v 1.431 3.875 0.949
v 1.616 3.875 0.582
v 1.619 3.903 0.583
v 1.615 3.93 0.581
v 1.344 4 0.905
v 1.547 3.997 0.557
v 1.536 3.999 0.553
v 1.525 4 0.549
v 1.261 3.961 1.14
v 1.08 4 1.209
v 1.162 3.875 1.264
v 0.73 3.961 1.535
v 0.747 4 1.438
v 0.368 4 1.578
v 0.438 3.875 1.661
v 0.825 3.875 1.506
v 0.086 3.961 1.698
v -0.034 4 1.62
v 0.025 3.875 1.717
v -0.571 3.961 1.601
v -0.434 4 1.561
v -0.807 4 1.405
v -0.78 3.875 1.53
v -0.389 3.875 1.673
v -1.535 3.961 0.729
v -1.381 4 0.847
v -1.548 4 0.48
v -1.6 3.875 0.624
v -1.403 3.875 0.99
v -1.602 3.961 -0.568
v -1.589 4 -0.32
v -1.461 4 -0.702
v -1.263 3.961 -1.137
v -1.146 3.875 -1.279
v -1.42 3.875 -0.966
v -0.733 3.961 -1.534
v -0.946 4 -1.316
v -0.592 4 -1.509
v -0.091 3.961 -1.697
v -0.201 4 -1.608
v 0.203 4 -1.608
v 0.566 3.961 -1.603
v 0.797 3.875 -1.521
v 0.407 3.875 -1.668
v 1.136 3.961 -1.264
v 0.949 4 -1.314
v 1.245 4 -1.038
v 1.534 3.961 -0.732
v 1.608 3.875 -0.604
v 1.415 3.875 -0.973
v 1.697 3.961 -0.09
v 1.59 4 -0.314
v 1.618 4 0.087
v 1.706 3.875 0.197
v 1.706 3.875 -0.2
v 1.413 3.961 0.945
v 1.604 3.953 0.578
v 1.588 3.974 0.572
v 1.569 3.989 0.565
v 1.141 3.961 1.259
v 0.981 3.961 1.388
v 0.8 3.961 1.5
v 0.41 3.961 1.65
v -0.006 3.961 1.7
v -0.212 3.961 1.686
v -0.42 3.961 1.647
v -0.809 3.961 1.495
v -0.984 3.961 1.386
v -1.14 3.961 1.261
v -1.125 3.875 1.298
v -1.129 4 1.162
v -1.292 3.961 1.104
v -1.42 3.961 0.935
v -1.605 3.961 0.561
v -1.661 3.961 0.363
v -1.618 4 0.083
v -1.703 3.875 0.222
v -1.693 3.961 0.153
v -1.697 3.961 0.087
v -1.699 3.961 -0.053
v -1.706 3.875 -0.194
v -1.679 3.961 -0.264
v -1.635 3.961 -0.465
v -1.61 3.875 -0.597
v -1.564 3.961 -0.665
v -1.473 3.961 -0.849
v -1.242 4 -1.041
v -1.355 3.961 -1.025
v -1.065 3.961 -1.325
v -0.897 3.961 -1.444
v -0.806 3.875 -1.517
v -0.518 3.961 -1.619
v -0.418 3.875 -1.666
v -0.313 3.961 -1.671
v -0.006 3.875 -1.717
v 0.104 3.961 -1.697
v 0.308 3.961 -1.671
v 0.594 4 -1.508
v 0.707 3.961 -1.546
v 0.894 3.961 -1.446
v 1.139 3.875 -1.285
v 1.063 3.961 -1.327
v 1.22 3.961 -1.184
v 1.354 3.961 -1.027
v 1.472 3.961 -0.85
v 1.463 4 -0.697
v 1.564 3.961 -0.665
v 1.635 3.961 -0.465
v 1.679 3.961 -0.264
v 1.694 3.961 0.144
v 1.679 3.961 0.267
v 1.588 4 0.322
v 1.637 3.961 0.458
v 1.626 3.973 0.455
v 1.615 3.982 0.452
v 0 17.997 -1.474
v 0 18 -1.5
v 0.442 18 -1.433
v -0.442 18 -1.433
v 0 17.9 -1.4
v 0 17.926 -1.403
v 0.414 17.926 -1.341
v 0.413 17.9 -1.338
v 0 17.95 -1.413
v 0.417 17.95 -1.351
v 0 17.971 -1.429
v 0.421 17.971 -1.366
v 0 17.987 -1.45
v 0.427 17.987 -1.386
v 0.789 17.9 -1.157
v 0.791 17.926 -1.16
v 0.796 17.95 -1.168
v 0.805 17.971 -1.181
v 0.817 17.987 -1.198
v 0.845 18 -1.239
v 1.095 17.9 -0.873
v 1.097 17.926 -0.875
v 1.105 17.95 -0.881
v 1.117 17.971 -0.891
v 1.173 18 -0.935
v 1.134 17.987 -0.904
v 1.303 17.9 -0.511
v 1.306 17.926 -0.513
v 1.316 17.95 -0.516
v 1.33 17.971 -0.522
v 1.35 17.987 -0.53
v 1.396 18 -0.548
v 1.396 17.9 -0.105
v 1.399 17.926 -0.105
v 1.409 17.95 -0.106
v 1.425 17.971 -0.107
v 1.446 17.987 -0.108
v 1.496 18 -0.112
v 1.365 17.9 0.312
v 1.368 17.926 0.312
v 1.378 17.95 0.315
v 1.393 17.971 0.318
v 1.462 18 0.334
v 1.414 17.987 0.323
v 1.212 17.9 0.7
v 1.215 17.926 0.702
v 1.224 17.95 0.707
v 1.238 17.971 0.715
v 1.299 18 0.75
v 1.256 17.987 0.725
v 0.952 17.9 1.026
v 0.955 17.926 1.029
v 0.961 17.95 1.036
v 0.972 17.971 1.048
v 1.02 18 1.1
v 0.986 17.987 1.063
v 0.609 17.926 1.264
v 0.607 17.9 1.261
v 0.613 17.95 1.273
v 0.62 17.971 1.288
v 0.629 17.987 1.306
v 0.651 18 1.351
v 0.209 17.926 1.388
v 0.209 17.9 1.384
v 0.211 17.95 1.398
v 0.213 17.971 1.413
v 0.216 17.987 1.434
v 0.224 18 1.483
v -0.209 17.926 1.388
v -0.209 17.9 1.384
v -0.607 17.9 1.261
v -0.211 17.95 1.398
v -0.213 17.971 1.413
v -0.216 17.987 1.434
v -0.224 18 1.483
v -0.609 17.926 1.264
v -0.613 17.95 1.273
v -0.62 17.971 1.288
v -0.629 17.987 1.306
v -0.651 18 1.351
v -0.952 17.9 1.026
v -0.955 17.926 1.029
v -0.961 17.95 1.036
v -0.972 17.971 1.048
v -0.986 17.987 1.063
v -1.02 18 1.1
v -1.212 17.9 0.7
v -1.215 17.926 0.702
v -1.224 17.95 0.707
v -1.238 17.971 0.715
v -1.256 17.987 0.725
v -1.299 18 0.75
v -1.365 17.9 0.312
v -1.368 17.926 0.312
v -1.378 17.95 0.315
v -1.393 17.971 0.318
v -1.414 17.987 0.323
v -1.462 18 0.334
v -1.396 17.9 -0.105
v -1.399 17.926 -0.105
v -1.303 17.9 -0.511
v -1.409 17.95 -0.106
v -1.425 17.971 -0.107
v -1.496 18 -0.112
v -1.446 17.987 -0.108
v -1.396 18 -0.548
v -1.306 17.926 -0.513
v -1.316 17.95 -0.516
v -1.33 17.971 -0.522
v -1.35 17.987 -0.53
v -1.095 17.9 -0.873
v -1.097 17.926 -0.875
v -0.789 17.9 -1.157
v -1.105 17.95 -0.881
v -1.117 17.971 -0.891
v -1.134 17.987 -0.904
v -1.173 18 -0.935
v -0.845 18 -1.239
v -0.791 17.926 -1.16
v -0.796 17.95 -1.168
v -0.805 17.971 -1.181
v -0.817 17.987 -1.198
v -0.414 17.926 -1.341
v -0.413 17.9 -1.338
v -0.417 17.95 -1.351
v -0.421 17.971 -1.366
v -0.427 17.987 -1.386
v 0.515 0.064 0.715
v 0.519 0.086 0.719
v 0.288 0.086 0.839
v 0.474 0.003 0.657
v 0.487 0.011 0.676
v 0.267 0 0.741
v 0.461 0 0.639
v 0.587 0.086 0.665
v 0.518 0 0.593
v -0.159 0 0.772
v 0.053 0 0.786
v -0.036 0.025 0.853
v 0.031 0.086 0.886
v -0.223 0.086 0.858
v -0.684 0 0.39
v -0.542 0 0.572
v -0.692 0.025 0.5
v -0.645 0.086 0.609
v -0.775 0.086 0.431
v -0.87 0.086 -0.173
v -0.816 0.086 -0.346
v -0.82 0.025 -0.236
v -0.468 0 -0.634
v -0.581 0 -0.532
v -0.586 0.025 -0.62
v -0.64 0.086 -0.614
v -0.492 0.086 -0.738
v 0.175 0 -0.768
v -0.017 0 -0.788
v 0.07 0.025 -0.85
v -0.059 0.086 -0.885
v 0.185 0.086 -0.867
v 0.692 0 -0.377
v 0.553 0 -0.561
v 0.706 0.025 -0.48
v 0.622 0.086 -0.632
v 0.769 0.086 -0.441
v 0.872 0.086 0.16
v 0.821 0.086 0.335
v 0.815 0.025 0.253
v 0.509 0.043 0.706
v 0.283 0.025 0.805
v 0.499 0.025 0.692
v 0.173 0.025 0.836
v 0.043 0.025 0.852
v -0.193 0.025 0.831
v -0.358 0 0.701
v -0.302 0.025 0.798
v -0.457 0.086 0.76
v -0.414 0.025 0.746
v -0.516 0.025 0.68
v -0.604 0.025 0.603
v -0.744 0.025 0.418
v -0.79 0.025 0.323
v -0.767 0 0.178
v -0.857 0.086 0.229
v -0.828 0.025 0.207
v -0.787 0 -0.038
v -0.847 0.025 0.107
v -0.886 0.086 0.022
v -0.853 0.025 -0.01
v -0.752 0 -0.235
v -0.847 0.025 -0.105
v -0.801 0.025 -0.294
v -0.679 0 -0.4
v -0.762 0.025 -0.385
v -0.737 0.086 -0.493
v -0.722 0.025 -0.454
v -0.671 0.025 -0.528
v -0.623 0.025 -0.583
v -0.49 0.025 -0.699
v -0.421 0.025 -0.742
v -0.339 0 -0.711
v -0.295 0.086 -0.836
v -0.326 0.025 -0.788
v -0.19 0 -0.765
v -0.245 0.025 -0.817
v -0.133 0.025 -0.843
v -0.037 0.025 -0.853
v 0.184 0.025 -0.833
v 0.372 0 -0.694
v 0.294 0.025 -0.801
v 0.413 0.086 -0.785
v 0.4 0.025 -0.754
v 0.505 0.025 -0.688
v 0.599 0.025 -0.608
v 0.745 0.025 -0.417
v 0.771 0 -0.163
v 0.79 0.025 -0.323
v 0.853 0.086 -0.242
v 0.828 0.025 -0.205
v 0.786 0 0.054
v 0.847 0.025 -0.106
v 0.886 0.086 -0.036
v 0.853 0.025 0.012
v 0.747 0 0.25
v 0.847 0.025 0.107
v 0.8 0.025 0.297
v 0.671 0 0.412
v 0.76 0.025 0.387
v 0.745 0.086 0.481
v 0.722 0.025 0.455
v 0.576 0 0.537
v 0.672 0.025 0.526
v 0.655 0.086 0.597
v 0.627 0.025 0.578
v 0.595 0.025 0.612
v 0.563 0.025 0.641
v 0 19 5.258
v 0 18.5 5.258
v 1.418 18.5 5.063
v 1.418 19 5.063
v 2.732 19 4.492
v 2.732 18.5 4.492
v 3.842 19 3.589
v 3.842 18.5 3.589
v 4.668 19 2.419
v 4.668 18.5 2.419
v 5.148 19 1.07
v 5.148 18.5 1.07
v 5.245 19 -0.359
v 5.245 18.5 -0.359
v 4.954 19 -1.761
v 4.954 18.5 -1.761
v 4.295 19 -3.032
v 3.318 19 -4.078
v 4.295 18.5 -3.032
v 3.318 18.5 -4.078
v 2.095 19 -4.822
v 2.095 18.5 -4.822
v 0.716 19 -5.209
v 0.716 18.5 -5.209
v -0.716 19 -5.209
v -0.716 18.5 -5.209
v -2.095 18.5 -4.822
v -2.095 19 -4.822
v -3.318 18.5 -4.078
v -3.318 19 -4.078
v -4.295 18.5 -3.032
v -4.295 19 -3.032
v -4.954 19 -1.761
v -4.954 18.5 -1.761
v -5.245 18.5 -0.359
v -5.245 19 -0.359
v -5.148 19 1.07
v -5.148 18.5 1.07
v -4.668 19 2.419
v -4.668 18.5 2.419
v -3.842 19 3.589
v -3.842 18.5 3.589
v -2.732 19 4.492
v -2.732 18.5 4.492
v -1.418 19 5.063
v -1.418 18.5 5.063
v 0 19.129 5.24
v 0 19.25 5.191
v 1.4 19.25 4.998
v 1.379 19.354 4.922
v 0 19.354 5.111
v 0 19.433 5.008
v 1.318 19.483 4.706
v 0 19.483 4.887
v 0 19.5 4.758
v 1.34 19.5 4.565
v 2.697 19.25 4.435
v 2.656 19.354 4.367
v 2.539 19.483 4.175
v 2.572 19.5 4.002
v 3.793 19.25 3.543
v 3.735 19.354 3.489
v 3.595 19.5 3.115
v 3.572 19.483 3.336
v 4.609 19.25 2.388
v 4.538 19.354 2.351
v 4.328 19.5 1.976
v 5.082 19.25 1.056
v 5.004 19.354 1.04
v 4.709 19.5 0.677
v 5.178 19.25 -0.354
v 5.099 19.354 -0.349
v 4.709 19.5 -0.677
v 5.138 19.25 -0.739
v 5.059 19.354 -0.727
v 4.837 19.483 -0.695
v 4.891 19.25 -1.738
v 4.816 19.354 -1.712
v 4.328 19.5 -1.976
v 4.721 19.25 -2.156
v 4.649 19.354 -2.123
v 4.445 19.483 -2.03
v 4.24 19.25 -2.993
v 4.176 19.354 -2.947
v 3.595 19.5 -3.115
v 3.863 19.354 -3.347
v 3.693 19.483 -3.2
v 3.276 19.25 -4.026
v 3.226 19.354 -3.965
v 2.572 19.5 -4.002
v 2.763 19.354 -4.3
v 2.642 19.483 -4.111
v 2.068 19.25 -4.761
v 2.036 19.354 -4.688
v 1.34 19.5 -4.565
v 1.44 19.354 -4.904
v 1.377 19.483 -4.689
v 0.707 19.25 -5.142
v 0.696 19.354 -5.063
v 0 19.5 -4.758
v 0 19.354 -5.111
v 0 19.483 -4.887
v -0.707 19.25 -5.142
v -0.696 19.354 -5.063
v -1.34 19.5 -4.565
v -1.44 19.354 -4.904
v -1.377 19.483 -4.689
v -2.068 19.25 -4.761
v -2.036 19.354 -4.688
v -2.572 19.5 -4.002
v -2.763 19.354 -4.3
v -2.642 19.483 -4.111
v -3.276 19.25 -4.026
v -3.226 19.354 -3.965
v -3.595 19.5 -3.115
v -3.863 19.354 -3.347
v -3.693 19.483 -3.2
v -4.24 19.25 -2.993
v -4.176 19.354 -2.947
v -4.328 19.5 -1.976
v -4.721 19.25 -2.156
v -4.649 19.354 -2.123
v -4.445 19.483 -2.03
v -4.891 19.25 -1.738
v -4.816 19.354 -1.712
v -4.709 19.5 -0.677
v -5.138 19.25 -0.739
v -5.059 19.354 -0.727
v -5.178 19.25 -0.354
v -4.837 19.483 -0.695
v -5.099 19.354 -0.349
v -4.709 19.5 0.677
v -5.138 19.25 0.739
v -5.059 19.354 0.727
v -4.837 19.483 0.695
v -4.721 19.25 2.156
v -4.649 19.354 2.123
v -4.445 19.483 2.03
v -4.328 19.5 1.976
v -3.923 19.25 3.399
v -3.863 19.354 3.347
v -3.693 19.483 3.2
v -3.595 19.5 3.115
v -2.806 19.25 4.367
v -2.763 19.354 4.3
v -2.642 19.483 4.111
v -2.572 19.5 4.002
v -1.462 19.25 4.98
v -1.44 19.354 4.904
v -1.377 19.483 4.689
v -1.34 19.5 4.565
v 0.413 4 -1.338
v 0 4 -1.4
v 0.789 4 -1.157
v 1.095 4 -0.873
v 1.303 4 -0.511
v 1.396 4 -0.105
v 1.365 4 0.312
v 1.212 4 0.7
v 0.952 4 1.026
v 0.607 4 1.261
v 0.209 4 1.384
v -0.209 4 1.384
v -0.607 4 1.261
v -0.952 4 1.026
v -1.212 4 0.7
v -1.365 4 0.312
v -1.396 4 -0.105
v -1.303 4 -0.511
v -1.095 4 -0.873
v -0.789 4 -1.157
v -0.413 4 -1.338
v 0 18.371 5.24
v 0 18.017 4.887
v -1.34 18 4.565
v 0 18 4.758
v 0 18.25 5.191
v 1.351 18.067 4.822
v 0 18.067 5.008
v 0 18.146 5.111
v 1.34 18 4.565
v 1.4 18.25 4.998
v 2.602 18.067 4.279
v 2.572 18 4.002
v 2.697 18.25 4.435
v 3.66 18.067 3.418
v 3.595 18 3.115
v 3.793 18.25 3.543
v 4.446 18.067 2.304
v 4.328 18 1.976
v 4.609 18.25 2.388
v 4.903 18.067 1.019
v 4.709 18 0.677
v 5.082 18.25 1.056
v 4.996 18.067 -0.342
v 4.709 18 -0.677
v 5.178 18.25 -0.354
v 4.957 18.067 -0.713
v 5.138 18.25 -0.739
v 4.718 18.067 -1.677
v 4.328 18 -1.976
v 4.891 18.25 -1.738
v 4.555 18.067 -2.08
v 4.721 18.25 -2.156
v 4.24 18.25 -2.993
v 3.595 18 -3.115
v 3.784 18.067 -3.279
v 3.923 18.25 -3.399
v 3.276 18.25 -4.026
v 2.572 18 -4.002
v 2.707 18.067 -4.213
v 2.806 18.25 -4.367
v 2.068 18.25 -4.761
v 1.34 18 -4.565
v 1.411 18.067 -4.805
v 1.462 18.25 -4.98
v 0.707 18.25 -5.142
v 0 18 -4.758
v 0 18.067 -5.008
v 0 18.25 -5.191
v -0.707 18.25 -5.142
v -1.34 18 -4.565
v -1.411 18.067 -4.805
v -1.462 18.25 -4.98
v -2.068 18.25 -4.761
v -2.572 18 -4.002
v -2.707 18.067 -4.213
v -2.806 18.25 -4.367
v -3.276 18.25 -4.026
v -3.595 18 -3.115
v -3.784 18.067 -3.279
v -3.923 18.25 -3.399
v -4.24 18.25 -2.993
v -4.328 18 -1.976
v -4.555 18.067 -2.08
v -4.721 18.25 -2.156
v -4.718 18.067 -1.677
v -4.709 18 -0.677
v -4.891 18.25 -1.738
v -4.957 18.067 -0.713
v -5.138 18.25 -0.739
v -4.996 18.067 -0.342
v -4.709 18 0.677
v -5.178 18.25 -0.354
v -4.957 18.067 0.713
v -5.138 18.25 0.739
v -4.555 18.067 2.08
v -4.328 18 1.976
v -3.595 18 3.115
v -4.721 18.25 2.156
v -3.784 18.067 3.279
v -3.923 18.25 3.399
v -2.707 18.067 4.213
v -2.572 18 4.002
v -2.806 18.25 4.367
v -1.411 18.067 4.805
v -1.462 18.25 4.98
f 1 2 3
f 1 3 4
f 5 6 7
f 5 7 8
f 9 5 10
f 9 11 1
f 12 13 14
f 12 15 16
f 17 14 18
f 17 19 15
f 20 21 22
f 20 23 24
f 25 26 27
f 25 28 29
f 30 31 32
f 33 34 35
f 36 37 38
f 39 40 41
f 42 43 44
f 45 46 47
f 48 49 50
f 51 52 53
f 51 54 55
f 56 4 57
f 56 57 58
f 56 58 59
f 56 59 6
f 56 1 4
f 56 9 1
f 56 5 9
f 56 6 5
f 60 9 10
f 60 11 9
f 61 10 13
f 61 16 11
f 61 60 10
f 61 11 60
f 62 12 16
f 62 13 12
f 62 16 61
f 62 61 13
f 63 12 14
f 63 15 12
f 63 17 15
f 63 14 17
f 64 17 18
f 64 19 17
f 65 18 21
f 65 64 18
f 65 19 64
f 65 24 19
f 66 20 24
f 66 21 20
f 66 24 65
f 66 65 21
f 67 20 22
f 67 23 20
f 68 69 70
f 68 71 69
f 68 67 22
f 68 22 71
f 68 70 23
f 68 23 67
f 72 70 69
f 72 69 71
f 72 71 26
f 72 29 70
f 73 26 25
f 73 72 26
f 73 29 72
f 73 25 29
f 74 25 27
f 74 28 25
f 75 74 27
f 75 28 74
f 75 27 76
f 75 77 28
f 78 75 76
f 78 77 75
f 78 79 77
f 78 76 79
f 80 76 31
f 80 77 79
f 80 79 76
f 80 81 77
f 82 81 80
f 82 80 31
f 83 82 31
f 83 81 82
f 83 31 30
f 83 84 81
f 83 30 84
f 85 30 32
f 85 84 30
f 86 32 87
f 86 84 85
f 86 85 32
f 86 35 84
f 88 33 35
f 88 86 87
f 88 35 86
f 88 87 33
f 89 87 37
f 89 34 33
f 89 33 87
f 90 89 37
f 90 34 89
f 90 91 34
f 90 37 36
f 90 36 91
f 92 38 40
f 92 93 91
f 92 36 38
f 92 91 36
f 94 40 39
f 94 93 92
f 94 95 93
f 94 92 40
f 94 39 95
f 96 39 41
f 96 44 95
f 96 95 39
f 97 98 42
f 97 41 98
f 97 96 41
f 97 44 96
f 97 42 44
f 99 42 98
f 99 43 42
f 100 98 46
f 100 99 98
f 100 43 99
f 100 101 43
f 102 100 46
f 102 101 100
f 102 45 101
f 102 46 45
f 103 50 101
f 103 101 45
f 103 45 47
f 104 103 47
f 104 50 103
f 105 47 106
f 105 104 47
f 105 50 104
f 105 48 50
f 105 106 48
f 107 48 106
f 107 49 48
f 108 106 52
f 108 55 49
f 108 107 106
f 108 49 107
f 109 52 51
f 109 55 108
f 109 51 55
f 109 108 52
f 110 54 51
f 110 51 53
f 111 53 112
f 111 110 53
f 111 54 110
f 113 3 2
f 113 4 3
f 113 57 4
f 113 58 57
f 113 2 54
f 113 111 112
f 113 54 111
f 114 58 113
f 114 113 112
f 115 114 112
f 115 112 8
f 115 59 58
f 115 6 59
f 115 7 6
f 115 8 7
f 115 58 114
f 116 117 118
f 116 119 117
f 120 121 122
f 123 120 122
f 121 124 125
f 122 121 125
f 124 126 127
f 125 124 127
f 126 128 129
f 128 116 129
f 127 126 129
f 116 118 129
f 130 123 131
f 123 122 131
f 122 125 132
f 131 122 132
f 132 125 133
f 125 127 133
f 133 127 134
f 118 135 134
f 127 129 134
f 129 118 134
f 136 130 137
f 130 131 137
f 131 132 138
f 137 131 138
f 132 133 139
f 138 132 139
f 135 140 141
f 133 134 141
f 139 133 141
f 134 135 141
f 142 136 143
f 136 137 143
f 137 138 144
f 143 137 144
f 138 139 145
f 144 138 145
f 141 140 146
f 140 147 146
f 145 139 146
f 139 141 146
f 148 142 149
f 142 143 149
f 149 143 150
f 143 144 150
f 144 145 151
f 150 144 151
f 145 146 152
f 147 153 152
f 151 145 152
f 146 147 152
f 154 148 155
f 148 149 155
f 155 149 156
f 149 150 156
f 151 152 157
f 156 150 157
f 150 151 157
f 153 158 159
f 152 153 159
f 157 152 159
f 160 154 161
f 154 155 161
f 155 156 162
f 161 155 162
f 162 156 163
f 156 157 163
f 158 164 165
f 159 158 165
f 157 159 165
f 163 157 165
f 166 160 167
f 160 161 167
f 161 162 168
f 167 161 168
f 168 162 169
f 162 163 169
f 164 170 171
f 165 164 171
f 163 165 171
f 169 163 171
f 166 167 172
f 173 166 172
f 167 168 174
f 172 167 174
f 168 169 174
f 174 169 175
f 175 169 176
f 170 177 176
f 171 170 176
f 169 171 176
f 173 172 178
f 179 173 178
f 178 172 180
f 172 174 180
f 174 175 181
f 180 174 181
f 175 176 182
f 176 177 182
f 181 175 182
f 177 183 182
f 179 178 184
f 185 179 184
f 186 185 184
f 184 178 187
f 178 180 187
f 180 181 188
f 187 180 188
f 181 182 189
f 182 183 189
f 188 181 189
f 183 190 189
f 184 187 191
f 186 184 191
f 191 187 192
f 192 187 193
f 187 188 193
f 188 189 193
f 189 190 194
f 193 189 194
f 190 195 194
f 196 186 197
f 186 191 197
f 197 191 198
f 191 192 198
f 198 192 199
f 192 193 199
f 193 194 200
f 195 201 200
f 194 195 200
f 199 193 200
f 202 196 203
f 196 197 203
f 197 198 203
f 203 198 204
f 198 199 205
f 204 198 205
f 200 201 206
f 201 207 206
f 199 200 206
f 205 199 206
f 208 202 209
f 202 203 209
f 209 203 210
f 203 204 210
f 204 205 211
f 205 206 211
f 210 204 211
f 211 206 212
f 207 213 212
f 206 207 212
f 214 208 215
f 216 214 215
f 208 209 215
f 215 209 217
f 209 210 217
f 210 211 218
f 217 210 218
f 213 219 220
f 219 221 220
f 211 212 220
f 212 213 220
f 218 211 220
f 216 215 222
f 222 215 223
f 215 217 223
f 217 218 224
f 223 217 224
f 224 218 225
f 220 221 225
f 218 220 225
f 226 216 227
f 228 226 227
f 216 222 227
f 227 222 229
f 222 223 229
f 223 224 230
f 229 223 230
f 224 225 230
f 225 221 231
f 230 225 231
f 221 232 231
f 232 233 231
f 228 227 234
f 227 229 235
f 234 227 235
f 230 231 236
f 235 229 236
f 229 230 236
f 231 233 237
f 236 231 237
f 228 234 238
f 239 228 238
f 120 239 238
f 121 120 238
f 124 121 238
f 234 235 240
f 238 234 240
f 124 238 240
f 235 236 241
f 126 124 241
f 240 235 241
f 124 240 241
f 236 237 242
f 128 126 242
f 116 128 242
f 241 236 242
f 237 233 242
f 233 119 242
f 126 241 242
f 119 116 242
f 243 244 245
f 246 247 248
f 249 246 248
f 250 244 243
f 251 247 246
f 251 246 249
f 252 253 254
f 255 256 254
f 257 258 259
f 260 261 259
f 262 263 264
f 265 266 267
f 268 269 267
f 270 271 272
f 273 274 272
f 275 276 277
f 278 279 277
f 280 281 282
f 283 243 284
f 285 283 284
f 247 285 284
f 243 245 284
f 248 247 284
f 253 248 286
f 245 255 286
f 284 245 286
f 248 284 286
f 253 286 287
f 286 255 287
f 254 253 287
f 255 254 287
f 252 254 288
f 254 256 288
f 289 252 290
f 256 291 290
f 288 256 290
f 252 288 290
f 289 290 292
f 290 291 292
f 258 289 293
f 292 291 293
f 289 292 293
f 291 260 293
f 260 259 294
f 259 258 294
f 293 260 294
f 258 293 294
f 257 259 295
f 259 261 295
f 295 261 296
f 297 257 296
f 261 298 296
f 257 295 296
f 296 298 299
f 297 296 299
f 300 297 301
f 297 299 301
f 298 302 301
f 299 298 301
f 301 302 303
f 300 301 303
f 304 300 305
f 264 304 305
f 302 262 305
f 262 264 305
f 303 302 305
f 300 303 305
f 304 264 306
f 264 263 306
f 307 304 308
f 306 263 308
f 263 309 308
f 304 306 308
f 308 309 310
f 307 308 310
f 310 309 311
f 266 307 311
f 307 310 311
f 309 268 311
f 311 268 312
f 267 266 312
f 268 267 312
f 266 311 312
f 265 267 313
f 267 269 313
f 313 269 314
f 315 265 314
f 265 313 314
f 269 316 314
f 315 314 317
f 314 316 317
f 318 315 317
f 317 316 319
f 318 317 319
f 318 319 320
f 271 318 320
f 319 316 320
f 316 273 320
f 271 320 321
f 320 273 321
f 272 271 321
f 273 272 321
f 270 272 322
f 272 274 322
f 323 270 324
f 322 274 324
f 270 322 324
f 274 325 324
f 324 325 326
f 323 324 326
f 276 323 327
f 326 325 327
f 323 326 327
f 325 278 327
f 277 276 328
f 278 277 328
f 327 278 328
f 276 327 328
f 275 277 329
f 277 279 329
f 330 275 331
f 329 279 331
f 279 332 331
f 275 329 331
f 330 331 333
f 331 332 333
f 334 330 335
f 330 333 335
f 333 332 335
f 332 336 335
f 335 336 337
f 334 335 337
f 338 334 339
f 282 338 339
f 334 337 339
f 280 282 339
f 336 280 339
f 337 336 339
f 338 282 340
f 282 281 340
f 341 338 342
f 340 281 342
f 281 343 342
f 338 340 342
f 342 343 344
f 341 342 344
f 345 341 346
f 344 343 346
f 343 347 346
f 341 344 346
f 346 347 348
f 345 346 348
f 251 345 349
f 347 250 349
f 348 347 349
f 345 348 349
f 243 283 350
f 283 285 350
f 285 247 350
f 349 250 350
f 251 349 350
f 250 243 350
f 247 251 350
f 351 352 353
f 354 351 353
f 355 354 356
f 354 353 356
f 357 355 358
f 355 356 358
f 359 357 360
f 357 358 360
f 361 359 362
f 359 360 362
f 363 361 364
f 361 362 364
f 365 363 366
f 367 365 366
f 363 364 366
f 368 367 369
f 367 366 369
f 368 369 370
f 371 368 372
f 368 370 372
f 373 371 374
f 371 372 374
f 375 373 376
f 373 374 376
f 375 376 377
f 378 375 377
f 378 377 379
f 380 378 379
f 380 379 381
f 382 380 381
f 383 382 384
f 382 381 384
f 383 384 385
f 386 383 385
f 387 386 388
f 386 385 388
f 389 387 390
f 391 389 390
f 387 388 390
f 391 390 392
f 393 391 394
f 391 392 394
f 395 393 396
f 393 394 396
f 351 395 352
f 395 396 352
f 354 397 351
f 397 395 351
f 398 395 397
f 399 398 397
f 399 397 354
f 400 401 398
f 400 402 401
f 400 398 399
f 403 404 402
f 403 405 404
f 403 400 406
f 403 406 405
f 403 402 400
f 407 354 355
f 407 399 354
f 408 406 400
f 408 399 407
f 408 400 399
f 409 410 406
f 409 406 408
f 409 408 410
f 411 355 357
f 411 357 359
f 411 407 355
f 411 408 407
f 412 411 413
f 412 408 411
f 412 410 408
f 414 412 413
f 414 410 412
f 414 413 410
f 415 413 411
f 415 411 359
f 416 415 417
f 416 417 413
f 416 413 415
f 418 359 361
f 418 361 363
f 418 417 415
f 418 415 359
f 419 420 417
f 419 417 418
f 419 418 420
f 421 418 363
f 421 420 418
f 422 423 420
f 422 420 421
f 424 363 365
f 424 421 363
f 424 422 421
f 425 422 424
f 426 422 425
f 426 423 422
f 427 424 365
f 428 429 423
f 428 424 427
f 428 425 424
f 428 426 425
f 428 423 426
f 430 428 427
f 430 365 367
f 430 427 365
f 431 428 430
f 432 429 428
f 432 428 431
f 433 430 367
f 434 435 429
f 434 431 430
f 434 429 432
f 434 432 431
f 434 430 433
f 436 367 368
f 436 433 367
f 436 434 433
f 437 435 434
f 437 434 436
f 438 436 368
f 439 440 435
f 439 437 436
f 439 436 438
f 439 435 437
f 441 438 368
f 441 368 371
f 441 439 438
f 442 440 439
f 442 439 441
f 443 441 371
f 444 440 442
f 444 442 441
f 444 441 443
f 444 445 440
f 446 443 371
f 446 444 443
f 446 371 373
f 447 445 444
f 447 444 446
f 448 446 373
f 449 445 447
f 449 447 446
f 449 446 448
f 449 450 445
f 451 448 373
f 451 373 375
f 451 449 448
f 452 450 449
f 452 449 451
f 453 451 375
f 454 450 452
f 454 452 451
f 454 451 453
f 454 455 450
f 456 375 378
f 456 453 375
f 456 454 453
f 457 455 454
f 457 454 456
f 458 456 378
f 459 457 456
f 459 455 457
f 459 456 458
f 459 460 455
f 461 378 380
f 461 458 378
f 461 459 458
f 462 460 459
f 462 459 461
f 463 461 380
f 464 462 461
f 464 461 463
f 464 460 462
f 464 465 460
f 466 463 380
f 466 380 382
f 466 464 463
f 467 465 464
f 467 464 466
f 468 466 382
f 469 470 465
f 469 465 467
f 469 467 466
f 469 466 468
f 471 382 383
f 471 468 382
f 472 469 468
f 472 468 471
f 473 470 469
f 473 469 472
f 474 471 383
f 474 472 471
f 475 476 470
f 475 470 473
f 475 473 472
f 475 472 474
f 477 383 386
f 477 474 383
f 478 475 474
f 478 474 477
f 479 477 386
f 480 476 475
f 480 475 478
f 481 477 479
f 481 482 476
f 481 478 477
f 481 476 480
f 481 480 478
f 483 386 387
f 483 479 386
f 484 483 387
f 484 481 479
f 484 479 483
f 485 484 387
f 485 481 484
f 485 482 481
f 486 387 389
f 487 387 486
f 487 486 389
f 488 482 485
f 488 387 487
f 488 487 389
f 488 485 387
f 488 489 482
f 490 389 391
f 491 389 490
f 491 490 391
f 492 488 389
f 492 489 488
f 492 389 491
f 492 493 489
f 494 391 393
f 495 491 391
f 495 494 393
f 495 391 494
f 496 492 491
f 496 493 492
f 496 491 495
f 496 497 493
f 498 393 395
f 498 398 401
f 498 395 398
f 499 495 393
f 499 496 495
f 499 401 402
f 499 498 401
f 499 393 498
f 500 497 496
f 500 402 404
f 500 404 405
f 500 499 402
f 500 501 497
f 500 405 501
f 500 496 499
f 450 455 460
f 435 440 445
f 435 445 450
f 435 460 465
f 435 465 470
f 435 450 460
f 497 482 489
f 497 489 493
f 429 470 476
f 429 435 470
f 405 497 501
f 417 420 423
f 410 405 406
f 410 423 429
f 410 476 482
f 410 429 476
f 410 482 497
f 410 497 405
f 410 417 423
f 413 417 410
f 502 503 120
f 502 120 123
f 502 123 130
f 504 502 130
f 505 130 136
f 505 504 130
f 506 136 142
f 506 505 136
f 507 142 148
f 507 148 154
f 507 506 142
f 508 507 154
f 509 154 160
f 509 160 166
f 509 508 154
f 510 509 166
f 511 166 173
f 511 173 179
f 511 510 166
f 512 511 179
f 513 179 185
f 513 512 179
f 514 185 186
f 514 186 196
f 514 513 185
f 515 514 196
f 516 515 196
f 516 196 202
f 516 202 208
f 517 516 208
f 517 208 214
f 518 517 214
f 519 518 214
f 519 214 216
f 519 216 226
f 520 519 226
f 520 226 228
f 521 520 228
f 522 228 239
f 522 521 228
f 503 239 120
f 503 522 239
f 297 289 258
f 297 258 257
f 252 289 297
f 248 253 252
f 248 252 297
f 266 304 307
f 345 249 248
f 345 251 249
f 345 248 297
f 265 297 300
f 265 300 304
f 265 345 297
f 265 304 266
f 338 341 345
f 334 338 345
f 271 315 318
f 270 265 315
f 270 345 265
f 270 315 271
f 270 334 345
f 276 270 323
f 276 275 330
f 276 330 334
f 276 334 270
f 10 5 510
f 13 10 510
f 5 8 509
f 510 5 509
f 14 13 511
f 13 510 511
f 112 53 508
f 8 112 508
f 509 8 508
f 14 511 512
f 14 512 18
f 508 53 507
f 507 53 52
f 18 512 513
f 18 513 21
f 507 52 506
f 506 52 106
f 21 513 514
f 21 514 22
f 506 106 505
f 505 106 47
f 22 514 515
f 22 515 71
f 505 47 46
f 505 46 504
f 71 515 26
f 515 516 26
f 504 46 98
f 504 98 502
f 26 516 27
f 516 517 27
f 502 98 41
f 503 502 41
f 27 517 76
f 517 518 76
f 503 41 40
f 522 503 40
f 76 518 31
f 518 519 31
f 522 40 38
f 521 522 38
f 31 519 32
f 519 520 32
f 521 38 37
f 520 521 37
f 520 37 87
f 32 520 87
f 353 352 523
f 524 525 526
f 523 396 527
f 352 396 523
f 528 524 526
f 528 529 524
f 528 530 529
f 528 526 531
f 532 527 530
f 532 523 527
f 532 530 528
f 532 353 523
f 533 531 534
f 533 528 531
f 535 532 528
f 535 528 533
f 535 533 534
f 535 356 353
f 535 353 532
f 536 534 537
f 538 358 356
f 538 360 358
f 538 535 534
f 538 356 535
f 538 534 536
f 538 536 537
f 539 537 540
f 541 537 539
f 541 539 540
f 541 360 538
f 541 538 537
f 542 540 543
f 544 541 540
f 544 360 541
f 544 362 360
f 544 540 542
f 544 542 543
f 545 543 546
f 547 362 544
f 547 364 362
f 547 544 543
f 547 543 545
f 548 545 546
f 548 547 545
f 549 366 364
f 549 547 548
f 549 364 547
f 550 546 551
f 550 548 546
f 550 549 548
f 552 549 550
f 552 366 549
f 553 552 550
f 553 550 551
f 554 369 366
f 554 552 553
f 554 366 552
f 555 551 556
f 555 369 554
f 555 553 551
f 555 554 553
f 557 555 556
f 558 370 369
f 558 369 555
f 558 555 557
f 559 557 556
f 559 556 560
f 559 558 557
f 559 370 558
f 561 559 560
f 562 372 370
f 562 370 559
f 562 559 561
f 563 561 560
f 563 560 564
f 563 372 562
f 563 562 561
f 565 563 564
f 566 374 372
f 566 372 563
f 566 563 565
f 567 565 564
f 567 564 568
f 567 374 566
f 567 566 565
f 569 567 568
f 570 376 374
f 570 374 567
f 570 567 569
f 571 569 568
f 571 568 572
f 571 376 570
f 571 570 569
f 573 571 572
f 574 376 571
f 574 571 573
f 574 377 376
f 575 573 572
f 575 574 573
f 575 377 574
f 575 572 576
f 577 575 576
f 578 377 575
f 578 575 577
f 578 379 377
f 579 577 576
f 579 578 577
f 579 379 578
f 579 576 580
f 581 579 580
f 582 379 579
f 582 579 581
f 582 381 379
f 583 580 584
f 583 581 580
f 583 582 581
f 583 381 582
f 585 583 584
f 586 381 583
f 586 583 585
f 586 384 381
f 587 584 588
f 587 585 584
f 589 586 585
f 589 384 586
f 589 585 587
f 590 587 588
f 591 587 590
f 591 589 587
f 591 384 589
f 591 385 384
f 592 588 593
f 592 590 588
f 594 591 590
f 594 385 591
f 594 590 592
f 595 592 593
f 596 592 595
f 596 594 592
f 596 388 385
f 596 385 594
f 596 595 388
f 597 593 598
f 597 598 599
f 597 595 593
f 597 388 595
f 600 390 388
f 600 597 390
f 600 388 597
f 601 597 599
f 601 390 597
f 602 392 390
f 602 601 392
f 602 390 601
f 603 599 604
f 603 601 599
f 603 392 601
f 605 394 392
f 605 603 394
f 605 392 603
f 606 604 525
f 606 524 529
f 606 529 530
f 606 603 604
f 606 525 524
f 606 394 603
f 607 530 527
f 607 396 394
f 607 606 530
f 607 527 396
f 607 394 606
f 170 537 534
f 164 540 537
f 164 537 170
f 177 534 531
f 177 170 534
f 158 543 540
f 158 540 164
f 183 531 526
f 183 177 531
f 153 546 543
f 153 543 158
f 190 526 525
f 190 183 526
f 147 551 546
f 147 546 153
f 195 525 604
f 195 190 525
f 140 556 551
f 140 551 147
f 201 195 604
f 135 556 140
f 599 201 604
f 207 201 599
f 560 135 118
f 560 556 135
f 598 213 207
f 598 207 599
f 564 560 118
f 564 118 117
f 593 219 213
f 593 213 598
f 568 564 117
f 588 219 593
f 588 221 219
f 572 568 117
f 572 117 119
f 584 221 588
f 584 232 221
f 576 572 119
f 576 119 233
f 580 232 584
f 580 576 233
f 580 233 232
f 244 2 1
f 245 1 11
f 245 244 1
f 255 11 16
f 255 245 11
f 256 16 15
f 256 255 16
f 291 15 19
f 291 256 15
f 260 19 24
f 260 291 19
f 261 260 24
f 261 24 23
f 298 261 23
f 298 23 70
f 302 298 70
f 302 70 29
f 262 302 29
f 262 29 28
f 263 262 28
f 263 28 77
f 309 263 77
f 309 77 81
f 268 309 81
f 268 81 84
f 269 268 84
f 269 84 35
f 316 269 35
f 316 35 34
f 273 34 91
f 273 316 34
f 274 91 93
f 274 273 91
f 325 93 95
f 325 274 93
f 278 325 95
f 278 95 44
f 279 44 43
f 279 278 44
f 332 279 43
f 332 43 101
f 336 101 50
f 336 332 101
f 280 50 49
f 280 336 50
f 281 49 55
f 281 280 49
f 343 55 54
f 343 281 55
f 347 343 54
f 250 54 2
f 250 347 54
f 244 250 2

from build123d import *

# Parameters (mm, degrees)
SKETCH1_R           = 1.75
BOSS_EXTRUDE2_DEPTH = 18
SKETCH2_R           = 5.2575
BOSS_EXTRUDE3_DEPTH = 1.5
CUT_EXTRUDE1_START  = 11.5
SKETCH9_R           = 1.75
CUT_EXTRUDE1_DEPTH  = 11.5
SKETCH10_R          = 1.75
SKETCH10_R_2        = 1.4
CUT_EXTRUDE3_DEPTH  = 14
FILLET2_R           = 0.1
FILLET3_R           = 0.1
FILLET4_R           = 0.5


with BuildPart() as part:
    # Sketch1 → Boss-Extrude2 (new body)
    with BuildSketch(Plane(origin=(0, 0, 0), x_dir=(1, 0, 0), z_dir=(0, 1, 0))):
        with Locations(Location((0, 0, 0), (0, 0, 270))):
            Circle(SKETCH1_R)
    extrude(amount=BOSS_EXTRUDE2_DEPTH)

    # Sketch2 → Boss-Extrude3 (add)
    with BuildSketch(Plane(origin=(0, 18, 0), x_dir=(1, 0, 0), z_dir=(0, 1, 0))):
        with Locations(Location((0, 0, 0), (0, 0, 270))):
            Circle(SKETCH2_R)
    extrude(amount=BOSS_EXTRUDE3_DEPTH)

    # Sketch9 → Cut-Extrude1 (cut)
    with BuildSketch(Plane(origin=(0, 4, 0), x_dir=(-1, 0, 0), z_dir=(0, -1, 0)).offset(CUT_EXTRUDE1_START)):
        with Locations(Location((0, 0, 0), (0, 0, 90))):
            Circle(SKETCH9_R)
    extrude(amount=-CUT_EXTRUDE1_DEPTH, mode=Mode.SUBTRACT)

    # Loft1: read off the stored shape, not the designer's step
    # Loft1: loft between two sections, ruled curve by curve
    loft1_from = [
        Edge.make_bspline([(1.652055062, 4, 0.577246976), (0.49756111, 4, 3.8813571), (-2.806549014, 4, 2.726863148), (-1.652055062, 4, -0.577246976), (-0.49756111, 4, -3.8813571), (2.806549014, 4, -2.726863148), (1.652055062, 4, 0.577246976)], [0, 0, 0, 0, 0.5, 0.5, 0.5, 1, 1, 1, 1], 3, [1, 0.333333333, 0.333333333, 1, 0.333333333, 0.333333333, 1]),
    ]
    loft1_to = [
        Edge.make_bspline([(0.493640246, 0, 0.722457132), (-0.951274019, 0, 1.709737623), (-1.93855451, 0, 0.264823359), (-0.493640246, 0, -0.722457132), (0.951274019, 0, -1.709737623), (1.93855451, 0, -0.264823359), (0.493640246, 0, 0.722457132)], [0, 0, 0, 0, 0.5, 0.5, 0.5, 1, 1, 1, 1], 3, [1, 0.333333333, 0.333333333, 1, 0.333333333, 0.333333333, 1]),
    ]
    loft1 = Solid(Shell([*[Face.make_surface_from_curves(loft1_from[k], loft1_to[k]) for k in range(1)], Face(Wire(loft1_from)), Face(Wire(loft1_to))]))
    add(loft1)

    # Sketch10 → Cut-Extrude3 (cut)
    with BuildSketch(Plane(origin=(0, 4, 0), x_dir=(-1, 0, 0), z_dir=(0, -1, 0))):
        Circle(SKETCH10_R)
        with Locations(Location((0, 0, 0), (0, 0, 90))):
            Circle(SKETCH10_R_2, mode=Mode.SUBTRACT)
    extrude(amount=-CUT_EXTRUDE3_DEPTH, mode=Mode.SUBTRACT)

    # Fillet2
    fillet2_edges = [part.edges().sort_by_distance(p)[0] for p in [
        (-0.493640246, 0, -0.722457132),
        (-1.652055062, 4, -0.577246976),
    ]]
    fillet(fillet2_edges, radius=FILLET2_R)

    # Fillet3
    fillet3_edges = [part.edges().sort_by_distance(p)[0] for p in [
        (0, 18, 1.4),
    ]]
    fillet(fillet3_edges, radius=FILLET3_R)

    # Fillet4
    fillet4_edges = [part.edges().sort_by_distance(p)[0] for p in [
        (0, 18, -5.2575),
        (0, 19.5, -5.2575),
    ]]
    fillet(fillet4_edges, radius=FILLET4_R)


solid = part.part
